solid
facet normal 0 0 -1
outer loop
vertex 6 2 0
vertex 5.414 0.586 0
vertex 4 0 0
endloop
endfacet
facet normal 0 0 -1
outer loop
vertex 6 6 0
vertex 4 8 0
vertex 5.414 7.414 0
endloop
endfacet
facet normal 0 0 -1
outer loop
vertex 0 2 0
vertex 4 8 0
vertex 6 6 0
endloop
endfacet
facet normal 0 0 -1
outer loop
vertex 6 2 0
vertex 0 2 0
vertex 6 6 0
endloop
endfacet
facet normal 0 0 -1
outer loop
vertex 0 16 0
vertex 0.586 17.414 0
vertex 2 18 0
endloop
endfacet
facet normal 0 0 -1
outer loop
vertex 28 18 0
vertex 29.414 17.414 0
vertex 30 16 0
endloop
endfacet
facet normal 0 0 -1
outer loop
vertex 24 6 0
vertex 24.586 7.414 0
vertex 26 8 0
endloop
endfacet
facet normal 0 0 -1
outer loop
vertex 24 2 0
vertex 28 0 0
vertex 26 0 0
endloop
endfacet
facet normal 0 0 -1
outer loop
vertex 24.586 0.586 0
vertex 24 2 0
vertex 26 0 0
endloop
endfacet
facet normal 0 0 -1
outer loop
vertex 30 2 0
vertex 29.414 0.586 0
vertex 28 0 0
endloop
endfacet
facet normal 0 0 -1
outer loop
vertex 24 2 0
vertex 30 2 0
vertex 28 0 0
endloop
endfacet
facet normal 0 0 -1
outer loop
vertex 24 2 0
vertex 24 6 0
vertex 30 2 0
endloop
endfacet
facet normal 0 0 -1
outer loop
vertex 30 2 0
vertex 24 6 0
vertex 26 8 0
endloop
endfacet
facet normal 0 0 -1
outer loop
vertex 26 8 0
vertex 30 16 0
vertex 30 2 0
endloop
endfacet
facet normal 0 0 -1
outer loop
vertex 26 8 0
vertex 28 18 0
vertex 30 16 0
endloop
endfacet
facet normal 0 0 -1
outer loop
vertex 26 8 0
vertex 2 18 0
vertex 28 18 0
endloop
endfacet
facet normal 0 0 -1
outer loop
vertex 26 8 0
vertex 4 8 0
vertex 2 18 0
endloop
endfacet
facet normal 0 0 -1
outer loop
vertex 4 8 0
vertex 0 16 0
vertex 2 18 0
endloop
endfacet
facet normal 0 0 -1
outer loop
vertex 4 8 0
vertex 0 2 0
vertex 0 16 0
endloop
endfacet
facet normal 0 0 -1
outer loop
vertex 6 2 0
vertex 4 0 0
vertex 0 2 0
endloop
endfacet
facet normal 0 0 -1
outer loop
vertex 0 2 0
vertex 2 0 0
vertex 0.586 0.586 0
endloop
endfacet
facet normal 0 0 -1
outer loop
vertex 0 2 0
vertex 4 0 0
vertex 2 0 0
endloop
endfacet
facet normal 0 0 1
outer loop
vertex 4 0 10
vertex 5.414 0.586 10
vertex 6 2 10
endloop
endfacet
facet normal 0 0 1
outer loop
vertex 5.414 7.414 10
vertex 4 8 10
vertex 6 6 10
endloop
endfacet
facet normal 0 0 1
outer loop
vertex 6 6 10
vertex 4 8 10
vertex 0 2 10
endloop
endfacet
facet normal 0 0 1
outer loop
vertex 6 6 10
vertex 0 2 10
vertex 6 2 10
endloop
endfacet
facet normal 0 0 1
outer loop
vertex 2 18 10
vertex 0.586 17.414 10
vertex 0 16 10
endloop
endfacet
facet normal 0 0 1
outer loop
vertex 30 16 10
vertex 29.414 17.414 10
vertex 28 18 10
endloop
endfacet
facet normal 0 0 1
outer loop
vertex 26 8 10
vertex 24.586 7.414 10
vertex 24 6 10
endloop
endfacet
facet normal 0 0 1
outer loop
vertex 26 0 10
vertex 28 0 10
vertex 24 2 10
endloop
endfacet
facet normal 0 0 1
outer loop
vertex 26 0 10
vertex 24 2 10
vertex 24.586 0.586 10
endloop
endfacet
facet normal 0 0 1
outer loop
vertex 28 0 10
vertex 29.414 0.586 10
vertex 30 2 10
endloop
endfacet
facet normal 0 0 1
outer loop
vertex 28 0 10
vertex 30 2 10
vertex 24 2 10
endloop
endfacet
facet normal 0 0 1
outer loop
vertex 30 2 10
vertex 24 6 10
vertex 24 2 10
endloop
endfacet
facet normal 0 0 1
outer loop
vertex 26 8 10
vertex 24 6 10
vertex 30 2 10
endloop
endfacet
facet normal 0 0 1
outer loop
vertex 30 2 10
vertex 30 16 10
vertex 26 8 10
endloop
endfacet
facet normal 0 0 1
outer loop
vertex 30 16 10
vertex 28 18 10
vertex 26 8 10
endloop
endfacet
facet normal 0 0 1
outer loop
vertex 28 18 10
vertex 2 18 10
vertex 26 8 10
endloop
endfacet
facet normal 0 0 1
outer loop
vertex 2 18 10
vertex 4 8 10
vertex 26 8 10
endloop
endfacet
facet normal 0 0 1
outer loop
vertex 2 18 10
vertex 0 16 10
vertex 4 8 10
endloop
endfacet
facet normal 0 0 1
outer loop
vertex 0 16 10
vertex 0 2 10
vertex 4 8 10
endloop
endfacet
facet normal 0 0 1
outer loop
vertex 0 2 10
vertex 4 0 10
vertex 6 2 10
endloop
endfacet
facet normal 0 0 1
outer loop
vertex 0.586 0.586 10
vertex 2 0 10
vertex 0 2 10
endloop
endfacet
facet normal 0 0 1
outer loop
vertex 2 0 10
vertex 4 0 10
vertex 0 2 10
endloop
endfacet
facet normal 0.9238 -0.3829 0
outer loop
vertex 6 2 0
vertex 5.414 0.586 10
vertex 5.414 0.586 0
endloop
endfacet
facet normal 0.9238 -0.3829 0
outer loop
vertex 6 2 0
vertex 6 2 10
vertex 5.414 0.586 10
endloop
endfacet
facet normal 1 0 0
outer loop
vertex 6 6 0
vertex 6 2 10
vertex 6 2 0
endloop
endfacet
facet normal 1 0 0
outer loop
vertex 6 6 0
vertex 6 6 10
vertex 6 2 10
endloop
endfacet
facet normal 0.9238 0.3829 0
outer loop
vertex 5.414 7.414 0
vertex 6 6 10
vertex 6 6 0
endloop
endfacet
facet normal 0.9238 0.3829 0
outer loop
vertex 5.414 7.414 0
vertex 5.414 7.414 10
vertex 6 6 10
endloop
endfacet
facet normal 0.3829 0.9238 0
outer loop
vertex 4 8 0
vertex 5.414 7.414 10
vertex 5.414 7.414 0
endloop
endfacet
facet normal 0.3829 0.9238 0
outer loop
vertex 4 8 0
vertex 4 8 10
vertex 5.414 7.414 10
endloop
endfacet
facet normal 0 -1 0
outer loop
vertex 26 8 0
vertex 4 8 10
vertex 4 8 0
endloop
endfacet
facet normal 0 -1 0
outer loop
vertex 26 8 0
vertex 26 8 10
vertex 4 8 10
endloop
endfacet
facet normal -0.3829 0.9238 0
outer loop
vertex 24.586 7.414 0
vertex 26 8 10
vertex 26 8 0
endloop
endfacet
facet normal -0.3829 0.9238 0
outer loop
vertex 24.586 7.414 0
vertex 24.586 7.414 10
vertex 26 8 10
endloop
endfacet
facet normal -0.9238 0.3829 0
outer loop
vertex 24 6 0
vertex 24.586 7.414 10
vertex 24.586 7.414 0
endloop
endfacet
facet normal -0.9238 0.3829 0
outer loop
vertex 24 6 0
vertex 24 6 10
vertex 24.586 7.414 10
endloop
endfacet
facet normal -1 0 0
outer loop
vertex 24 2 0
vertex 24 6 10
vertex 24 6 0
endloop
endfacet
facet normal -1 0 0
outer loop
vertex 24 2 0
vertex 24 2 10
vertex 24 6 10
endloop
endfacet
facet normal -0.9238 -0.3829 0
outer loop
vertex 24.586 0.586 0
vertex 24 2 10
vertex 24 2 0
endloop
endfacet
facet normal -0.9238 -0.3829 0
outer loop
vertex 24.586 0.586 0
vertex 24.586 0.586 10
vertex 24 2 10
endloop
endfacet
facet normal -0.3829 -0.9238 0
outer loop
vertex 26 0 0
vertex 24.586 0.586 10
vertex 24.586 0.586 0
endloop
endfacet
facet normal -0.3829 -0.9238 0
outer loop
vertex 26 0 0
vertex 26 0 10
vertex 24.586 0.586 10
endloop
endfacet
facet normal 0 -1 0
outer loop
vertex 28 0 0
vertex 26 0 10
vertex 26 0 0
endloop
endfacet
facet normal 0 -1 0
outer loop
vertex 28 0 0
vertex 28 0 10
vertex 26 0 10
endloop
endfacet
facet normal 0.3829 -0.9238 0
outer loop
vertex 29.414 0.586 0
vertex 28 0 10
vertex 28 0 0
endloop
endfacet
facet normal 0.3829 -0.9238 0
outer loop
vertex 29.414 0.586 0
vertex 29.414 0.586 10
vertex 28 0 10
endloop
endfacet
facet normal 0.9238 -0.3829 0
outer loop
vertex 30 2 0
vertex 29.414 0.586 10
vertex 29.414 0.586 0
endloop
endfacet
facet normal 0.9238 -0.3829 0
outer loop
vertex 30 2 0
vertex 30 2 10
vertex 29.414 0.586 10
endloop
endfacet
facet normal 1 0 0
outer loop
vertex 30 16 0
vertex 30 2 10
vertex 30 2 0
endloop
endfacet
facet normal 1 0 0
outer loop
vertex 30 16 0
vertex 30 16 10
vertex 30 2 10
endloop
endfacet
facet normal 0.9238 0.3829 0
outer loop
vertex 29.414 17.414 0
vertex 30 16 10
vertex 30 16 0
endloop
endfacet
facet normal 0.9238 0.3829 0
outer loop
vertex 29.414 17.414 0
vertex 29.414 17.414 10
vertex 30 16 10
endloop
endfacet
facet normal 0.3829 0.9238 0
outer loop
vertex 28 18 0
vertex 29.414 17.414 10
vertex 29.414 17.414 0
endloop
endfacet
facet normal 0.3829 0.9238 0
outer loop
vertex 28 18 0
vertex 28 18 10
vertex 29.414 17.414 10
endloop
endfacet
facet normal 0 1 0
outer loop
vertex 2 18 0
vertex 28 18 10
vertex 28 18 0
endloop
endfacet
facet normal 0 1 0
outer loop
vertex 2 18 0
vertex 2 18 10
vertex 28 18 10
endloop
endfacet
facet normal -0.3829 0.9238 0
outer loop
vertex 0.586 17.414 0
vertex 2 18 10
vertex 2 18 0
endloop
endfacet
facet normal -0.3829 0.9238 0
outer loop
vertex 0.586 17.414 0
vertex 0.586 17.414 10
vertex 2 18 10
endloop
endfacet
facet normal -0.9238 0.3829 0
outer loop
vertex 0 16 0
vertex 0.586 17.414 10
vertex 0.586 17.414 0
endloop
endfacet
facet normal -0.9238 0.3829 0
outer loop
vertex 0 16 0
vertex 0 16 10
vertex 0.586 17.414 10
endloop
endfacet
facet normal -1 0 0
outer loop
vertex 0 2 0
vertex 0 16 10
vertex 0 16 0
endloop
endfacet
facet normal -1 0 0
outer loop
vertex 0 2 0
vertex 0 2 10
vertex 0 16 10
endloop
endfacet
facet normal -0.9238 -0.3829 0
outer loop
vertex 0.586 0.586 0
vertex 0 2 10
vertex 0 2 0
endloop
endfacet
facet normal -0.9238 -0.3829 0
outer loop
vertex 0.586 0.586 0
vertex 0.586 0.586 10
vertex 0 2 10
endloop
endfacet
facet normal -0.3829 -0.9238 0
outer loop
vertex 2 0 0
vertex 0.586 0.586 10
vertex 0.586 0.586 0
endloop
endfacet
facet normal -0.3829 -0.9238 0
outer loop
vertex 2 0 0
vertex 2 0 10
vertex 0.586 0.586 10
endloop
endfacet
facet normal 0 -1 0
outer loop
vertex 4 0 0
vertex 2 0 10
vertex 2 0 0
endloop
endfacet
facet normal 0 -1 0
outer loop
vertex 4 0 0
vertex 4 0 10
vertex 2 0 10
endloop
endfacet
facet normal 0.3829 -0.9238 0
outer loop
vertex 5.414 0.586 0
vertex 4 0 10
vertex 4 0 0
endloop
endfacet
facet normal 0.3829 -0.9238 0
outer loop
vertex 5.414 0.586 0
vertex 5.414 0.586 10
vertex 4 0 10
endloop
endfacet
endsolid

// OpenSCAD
$fn = 32;

// ----------------------------------------------------------------------
// Clip blank: staple clip, 10 mm thick
// ----------------------------------------------------------------------

// --- parameters (mm) ---
profile_height = 10;      // extrusion height
profile_points = 24;      // points of the closed outline

profile = [[0, 2], [0.586, 0.586], [2, 0], [4, 0], [5.414, 0.586], [6, 2], [6, 6], [5.414, 7.414], [4, 8], [26, 8], [24.586, 7.414], [24, 6], [24, 2], [24.586, 0.586], [26, 0], [28, 0], [29.414, 0.586], [30, 2], [30, 16], [29.414, 17.414], [28, 18], [2, 18], [0.586, 17.414], [0, 16]];  // single closed polygon, 24 points, counter clockwise

// --- the one profile operation ---
linear_extrude(height = profile_height) polygon(points = profile);
